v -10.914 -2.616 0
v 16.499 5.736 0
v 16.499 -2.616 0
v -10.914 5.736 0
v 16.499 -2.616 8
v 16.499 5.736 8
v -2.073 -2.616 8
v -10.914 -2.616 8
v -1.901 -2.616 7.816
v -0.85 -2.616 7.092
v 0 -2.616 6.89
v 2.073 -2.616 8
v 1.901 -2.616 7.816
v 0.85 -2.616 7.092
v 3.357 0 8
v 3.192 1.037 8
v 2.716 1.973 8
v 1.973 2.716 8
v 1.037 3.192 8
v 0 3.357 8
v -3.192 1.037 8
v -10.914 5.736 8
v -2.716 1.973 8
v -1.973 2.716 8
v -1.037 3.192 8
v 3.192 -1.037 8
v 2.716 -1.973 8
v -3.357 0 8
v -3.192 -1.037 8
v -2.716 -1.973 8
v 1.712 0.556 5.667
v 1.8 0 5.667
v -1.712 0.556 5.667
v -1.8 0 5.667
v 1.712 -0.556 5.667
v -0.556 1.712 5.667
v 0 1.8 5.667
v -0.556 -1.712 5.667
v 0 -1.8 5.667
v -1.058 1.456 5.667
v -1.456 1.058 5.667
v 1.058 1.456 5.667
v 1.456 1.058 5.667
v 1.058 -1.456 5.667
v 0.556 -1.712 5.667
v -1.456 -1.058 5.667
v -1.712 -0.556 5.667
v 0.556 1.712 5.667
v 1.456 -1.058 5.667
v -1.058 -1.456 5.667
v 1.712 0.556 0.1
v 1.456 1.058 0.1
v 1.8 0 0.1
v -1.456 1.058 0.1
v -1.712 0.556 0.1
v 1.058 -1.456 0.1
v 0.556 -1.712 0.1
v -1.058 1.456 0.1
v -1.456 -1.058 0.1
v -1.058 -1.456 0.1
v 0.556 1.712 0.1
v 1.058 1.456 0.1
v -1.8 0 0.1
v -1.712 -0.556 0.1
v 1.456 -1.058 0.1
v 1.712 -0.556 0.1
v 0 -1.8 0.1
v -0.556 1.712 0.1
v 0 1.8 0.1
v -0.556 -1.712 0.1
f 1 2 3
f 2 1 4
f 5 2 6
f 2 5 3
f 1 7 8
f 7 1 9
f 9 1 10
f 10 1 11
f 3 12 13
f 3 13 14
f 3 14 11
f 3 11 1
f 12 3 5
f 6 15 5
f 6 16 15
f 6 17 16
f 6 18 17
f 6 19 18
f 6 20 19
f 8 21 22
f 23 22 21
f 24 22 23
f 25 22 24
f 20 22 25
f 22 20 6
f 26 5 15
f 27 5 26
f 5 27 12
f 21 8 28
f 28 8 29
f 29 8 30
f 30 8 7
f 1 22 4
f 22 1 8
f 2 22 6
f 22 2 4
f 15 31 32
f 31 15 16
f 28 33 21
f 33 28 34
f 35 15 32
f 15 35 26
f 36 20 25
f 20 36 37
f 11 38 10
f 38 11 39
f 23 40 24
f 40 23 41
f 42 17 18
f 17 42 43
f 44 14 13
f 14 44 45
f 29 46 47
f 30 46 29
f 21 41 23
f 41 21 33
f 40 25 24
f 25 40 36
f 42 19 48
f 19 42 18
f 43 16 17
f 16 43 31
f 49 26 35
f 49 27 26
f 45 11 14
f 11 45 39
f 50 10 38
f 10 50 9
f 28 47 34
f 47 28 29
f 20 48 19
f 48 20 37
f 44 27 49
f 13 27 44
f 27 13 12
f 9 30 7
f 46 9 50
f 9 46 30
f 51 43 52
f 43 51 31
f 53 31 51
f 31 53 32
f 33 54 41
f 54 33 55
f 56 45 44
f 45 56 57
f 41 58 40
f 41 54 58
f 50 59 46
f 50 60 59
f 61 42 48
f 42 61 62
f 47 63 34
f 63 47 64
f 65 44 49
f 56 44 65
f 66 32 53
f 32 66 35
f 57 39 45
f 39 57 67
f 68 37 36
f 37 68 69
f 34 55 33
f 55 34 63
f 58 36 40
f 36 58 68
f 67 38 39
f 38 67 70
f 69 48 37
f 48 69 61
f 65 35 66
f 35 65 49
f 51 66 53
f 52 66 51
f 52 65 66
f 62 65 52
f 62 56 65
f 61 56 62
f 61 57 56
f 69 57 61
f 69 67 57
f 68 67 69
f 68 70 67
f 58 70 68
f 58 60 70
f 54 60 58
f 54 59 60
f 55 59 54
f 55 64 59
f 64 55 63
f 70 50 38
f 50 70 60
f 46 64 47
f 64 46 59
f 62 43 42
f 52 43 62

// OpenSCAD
// Street Numbers for 3D printing
// Charles Tilford, 2019
// License: CC BY-NC-SA 4.0
//   https://creativecommons.org/licenses/by-nc-sa/4.0/

char="-";     // The number/letter to print

// Units are in mm, except for height of letter

// How many inches high should letter be?
inchesHigh=3;
// How thick/deep should letter be (mm)?
depth=8;

// Character coordinates just center the letter
charX=-16;    // Character X coord
charY=-27;    // Character Y coord
topScrew=0;  // Top screw Y coord
botScrew=0; // Bottom screw Y coord
height=8;     // Thickness of character
// Screw dimensions. Default presumes
// #6 sheet metal screw
screwWid=3.6; // Width of screw shaft
screwTop=6.78;// Width of screw head
screwCon=5.08;// Height of head 'cone'

// Font to print in. Your system needs this
// installed, of course. If changed the hole
// positions almost certainly need to be
// changed, and maybe charX/charY.
fName="Open Sans Extrabold";
// https://fonts.google.com/specimen/Open+Sans
// Designer: Steve Matteson

// Thin floor below holes. My printer was
// struggling to have the hole 'border' stick
// to the stage. Just drill/screw thru it.
holeFloor=0.1; 

// ==========================================
// ===== All values below are auto-calculated
// ==========================================

// Scaled values
scaleFactor=inchesHigh / 3;
cX=charX * scaleFactor;
cY=charY * scaleFactor;
tS=topScrew * scaleFactor;
bS=botScrew * scaleFactor;
// Where do we start drawing screw head cone?
oS=depth - (screwCon-.05);

difference() {
  // We use difference() to punch out the screw holes
  // in the character
    
  // The character itself, 8mm thick
  translate([cX,cY,0])
    linear_extrude(height=depth, scale=1)
    text(char, size=(75*scaleFactor),
         $fn=100, font=fName);

  // Just one screw hole
  translate([0,tS,oS]) color("red")
    cylinder(h=screwCon, d2=screwTop,
             d1=0, $fn=20);
  translate([0,tS,holeFloor])
    cylinder(h=20, d=screwWid, $fn=20);
}

// Colors are just to aid visualization of
// void spaces. $fn is "featuer number", ie how
// many polygons are devoted to object. The values
// above should be near your printing limit anyway.

// Developed in OpenSCAD
//    https://www.openscad.org/
